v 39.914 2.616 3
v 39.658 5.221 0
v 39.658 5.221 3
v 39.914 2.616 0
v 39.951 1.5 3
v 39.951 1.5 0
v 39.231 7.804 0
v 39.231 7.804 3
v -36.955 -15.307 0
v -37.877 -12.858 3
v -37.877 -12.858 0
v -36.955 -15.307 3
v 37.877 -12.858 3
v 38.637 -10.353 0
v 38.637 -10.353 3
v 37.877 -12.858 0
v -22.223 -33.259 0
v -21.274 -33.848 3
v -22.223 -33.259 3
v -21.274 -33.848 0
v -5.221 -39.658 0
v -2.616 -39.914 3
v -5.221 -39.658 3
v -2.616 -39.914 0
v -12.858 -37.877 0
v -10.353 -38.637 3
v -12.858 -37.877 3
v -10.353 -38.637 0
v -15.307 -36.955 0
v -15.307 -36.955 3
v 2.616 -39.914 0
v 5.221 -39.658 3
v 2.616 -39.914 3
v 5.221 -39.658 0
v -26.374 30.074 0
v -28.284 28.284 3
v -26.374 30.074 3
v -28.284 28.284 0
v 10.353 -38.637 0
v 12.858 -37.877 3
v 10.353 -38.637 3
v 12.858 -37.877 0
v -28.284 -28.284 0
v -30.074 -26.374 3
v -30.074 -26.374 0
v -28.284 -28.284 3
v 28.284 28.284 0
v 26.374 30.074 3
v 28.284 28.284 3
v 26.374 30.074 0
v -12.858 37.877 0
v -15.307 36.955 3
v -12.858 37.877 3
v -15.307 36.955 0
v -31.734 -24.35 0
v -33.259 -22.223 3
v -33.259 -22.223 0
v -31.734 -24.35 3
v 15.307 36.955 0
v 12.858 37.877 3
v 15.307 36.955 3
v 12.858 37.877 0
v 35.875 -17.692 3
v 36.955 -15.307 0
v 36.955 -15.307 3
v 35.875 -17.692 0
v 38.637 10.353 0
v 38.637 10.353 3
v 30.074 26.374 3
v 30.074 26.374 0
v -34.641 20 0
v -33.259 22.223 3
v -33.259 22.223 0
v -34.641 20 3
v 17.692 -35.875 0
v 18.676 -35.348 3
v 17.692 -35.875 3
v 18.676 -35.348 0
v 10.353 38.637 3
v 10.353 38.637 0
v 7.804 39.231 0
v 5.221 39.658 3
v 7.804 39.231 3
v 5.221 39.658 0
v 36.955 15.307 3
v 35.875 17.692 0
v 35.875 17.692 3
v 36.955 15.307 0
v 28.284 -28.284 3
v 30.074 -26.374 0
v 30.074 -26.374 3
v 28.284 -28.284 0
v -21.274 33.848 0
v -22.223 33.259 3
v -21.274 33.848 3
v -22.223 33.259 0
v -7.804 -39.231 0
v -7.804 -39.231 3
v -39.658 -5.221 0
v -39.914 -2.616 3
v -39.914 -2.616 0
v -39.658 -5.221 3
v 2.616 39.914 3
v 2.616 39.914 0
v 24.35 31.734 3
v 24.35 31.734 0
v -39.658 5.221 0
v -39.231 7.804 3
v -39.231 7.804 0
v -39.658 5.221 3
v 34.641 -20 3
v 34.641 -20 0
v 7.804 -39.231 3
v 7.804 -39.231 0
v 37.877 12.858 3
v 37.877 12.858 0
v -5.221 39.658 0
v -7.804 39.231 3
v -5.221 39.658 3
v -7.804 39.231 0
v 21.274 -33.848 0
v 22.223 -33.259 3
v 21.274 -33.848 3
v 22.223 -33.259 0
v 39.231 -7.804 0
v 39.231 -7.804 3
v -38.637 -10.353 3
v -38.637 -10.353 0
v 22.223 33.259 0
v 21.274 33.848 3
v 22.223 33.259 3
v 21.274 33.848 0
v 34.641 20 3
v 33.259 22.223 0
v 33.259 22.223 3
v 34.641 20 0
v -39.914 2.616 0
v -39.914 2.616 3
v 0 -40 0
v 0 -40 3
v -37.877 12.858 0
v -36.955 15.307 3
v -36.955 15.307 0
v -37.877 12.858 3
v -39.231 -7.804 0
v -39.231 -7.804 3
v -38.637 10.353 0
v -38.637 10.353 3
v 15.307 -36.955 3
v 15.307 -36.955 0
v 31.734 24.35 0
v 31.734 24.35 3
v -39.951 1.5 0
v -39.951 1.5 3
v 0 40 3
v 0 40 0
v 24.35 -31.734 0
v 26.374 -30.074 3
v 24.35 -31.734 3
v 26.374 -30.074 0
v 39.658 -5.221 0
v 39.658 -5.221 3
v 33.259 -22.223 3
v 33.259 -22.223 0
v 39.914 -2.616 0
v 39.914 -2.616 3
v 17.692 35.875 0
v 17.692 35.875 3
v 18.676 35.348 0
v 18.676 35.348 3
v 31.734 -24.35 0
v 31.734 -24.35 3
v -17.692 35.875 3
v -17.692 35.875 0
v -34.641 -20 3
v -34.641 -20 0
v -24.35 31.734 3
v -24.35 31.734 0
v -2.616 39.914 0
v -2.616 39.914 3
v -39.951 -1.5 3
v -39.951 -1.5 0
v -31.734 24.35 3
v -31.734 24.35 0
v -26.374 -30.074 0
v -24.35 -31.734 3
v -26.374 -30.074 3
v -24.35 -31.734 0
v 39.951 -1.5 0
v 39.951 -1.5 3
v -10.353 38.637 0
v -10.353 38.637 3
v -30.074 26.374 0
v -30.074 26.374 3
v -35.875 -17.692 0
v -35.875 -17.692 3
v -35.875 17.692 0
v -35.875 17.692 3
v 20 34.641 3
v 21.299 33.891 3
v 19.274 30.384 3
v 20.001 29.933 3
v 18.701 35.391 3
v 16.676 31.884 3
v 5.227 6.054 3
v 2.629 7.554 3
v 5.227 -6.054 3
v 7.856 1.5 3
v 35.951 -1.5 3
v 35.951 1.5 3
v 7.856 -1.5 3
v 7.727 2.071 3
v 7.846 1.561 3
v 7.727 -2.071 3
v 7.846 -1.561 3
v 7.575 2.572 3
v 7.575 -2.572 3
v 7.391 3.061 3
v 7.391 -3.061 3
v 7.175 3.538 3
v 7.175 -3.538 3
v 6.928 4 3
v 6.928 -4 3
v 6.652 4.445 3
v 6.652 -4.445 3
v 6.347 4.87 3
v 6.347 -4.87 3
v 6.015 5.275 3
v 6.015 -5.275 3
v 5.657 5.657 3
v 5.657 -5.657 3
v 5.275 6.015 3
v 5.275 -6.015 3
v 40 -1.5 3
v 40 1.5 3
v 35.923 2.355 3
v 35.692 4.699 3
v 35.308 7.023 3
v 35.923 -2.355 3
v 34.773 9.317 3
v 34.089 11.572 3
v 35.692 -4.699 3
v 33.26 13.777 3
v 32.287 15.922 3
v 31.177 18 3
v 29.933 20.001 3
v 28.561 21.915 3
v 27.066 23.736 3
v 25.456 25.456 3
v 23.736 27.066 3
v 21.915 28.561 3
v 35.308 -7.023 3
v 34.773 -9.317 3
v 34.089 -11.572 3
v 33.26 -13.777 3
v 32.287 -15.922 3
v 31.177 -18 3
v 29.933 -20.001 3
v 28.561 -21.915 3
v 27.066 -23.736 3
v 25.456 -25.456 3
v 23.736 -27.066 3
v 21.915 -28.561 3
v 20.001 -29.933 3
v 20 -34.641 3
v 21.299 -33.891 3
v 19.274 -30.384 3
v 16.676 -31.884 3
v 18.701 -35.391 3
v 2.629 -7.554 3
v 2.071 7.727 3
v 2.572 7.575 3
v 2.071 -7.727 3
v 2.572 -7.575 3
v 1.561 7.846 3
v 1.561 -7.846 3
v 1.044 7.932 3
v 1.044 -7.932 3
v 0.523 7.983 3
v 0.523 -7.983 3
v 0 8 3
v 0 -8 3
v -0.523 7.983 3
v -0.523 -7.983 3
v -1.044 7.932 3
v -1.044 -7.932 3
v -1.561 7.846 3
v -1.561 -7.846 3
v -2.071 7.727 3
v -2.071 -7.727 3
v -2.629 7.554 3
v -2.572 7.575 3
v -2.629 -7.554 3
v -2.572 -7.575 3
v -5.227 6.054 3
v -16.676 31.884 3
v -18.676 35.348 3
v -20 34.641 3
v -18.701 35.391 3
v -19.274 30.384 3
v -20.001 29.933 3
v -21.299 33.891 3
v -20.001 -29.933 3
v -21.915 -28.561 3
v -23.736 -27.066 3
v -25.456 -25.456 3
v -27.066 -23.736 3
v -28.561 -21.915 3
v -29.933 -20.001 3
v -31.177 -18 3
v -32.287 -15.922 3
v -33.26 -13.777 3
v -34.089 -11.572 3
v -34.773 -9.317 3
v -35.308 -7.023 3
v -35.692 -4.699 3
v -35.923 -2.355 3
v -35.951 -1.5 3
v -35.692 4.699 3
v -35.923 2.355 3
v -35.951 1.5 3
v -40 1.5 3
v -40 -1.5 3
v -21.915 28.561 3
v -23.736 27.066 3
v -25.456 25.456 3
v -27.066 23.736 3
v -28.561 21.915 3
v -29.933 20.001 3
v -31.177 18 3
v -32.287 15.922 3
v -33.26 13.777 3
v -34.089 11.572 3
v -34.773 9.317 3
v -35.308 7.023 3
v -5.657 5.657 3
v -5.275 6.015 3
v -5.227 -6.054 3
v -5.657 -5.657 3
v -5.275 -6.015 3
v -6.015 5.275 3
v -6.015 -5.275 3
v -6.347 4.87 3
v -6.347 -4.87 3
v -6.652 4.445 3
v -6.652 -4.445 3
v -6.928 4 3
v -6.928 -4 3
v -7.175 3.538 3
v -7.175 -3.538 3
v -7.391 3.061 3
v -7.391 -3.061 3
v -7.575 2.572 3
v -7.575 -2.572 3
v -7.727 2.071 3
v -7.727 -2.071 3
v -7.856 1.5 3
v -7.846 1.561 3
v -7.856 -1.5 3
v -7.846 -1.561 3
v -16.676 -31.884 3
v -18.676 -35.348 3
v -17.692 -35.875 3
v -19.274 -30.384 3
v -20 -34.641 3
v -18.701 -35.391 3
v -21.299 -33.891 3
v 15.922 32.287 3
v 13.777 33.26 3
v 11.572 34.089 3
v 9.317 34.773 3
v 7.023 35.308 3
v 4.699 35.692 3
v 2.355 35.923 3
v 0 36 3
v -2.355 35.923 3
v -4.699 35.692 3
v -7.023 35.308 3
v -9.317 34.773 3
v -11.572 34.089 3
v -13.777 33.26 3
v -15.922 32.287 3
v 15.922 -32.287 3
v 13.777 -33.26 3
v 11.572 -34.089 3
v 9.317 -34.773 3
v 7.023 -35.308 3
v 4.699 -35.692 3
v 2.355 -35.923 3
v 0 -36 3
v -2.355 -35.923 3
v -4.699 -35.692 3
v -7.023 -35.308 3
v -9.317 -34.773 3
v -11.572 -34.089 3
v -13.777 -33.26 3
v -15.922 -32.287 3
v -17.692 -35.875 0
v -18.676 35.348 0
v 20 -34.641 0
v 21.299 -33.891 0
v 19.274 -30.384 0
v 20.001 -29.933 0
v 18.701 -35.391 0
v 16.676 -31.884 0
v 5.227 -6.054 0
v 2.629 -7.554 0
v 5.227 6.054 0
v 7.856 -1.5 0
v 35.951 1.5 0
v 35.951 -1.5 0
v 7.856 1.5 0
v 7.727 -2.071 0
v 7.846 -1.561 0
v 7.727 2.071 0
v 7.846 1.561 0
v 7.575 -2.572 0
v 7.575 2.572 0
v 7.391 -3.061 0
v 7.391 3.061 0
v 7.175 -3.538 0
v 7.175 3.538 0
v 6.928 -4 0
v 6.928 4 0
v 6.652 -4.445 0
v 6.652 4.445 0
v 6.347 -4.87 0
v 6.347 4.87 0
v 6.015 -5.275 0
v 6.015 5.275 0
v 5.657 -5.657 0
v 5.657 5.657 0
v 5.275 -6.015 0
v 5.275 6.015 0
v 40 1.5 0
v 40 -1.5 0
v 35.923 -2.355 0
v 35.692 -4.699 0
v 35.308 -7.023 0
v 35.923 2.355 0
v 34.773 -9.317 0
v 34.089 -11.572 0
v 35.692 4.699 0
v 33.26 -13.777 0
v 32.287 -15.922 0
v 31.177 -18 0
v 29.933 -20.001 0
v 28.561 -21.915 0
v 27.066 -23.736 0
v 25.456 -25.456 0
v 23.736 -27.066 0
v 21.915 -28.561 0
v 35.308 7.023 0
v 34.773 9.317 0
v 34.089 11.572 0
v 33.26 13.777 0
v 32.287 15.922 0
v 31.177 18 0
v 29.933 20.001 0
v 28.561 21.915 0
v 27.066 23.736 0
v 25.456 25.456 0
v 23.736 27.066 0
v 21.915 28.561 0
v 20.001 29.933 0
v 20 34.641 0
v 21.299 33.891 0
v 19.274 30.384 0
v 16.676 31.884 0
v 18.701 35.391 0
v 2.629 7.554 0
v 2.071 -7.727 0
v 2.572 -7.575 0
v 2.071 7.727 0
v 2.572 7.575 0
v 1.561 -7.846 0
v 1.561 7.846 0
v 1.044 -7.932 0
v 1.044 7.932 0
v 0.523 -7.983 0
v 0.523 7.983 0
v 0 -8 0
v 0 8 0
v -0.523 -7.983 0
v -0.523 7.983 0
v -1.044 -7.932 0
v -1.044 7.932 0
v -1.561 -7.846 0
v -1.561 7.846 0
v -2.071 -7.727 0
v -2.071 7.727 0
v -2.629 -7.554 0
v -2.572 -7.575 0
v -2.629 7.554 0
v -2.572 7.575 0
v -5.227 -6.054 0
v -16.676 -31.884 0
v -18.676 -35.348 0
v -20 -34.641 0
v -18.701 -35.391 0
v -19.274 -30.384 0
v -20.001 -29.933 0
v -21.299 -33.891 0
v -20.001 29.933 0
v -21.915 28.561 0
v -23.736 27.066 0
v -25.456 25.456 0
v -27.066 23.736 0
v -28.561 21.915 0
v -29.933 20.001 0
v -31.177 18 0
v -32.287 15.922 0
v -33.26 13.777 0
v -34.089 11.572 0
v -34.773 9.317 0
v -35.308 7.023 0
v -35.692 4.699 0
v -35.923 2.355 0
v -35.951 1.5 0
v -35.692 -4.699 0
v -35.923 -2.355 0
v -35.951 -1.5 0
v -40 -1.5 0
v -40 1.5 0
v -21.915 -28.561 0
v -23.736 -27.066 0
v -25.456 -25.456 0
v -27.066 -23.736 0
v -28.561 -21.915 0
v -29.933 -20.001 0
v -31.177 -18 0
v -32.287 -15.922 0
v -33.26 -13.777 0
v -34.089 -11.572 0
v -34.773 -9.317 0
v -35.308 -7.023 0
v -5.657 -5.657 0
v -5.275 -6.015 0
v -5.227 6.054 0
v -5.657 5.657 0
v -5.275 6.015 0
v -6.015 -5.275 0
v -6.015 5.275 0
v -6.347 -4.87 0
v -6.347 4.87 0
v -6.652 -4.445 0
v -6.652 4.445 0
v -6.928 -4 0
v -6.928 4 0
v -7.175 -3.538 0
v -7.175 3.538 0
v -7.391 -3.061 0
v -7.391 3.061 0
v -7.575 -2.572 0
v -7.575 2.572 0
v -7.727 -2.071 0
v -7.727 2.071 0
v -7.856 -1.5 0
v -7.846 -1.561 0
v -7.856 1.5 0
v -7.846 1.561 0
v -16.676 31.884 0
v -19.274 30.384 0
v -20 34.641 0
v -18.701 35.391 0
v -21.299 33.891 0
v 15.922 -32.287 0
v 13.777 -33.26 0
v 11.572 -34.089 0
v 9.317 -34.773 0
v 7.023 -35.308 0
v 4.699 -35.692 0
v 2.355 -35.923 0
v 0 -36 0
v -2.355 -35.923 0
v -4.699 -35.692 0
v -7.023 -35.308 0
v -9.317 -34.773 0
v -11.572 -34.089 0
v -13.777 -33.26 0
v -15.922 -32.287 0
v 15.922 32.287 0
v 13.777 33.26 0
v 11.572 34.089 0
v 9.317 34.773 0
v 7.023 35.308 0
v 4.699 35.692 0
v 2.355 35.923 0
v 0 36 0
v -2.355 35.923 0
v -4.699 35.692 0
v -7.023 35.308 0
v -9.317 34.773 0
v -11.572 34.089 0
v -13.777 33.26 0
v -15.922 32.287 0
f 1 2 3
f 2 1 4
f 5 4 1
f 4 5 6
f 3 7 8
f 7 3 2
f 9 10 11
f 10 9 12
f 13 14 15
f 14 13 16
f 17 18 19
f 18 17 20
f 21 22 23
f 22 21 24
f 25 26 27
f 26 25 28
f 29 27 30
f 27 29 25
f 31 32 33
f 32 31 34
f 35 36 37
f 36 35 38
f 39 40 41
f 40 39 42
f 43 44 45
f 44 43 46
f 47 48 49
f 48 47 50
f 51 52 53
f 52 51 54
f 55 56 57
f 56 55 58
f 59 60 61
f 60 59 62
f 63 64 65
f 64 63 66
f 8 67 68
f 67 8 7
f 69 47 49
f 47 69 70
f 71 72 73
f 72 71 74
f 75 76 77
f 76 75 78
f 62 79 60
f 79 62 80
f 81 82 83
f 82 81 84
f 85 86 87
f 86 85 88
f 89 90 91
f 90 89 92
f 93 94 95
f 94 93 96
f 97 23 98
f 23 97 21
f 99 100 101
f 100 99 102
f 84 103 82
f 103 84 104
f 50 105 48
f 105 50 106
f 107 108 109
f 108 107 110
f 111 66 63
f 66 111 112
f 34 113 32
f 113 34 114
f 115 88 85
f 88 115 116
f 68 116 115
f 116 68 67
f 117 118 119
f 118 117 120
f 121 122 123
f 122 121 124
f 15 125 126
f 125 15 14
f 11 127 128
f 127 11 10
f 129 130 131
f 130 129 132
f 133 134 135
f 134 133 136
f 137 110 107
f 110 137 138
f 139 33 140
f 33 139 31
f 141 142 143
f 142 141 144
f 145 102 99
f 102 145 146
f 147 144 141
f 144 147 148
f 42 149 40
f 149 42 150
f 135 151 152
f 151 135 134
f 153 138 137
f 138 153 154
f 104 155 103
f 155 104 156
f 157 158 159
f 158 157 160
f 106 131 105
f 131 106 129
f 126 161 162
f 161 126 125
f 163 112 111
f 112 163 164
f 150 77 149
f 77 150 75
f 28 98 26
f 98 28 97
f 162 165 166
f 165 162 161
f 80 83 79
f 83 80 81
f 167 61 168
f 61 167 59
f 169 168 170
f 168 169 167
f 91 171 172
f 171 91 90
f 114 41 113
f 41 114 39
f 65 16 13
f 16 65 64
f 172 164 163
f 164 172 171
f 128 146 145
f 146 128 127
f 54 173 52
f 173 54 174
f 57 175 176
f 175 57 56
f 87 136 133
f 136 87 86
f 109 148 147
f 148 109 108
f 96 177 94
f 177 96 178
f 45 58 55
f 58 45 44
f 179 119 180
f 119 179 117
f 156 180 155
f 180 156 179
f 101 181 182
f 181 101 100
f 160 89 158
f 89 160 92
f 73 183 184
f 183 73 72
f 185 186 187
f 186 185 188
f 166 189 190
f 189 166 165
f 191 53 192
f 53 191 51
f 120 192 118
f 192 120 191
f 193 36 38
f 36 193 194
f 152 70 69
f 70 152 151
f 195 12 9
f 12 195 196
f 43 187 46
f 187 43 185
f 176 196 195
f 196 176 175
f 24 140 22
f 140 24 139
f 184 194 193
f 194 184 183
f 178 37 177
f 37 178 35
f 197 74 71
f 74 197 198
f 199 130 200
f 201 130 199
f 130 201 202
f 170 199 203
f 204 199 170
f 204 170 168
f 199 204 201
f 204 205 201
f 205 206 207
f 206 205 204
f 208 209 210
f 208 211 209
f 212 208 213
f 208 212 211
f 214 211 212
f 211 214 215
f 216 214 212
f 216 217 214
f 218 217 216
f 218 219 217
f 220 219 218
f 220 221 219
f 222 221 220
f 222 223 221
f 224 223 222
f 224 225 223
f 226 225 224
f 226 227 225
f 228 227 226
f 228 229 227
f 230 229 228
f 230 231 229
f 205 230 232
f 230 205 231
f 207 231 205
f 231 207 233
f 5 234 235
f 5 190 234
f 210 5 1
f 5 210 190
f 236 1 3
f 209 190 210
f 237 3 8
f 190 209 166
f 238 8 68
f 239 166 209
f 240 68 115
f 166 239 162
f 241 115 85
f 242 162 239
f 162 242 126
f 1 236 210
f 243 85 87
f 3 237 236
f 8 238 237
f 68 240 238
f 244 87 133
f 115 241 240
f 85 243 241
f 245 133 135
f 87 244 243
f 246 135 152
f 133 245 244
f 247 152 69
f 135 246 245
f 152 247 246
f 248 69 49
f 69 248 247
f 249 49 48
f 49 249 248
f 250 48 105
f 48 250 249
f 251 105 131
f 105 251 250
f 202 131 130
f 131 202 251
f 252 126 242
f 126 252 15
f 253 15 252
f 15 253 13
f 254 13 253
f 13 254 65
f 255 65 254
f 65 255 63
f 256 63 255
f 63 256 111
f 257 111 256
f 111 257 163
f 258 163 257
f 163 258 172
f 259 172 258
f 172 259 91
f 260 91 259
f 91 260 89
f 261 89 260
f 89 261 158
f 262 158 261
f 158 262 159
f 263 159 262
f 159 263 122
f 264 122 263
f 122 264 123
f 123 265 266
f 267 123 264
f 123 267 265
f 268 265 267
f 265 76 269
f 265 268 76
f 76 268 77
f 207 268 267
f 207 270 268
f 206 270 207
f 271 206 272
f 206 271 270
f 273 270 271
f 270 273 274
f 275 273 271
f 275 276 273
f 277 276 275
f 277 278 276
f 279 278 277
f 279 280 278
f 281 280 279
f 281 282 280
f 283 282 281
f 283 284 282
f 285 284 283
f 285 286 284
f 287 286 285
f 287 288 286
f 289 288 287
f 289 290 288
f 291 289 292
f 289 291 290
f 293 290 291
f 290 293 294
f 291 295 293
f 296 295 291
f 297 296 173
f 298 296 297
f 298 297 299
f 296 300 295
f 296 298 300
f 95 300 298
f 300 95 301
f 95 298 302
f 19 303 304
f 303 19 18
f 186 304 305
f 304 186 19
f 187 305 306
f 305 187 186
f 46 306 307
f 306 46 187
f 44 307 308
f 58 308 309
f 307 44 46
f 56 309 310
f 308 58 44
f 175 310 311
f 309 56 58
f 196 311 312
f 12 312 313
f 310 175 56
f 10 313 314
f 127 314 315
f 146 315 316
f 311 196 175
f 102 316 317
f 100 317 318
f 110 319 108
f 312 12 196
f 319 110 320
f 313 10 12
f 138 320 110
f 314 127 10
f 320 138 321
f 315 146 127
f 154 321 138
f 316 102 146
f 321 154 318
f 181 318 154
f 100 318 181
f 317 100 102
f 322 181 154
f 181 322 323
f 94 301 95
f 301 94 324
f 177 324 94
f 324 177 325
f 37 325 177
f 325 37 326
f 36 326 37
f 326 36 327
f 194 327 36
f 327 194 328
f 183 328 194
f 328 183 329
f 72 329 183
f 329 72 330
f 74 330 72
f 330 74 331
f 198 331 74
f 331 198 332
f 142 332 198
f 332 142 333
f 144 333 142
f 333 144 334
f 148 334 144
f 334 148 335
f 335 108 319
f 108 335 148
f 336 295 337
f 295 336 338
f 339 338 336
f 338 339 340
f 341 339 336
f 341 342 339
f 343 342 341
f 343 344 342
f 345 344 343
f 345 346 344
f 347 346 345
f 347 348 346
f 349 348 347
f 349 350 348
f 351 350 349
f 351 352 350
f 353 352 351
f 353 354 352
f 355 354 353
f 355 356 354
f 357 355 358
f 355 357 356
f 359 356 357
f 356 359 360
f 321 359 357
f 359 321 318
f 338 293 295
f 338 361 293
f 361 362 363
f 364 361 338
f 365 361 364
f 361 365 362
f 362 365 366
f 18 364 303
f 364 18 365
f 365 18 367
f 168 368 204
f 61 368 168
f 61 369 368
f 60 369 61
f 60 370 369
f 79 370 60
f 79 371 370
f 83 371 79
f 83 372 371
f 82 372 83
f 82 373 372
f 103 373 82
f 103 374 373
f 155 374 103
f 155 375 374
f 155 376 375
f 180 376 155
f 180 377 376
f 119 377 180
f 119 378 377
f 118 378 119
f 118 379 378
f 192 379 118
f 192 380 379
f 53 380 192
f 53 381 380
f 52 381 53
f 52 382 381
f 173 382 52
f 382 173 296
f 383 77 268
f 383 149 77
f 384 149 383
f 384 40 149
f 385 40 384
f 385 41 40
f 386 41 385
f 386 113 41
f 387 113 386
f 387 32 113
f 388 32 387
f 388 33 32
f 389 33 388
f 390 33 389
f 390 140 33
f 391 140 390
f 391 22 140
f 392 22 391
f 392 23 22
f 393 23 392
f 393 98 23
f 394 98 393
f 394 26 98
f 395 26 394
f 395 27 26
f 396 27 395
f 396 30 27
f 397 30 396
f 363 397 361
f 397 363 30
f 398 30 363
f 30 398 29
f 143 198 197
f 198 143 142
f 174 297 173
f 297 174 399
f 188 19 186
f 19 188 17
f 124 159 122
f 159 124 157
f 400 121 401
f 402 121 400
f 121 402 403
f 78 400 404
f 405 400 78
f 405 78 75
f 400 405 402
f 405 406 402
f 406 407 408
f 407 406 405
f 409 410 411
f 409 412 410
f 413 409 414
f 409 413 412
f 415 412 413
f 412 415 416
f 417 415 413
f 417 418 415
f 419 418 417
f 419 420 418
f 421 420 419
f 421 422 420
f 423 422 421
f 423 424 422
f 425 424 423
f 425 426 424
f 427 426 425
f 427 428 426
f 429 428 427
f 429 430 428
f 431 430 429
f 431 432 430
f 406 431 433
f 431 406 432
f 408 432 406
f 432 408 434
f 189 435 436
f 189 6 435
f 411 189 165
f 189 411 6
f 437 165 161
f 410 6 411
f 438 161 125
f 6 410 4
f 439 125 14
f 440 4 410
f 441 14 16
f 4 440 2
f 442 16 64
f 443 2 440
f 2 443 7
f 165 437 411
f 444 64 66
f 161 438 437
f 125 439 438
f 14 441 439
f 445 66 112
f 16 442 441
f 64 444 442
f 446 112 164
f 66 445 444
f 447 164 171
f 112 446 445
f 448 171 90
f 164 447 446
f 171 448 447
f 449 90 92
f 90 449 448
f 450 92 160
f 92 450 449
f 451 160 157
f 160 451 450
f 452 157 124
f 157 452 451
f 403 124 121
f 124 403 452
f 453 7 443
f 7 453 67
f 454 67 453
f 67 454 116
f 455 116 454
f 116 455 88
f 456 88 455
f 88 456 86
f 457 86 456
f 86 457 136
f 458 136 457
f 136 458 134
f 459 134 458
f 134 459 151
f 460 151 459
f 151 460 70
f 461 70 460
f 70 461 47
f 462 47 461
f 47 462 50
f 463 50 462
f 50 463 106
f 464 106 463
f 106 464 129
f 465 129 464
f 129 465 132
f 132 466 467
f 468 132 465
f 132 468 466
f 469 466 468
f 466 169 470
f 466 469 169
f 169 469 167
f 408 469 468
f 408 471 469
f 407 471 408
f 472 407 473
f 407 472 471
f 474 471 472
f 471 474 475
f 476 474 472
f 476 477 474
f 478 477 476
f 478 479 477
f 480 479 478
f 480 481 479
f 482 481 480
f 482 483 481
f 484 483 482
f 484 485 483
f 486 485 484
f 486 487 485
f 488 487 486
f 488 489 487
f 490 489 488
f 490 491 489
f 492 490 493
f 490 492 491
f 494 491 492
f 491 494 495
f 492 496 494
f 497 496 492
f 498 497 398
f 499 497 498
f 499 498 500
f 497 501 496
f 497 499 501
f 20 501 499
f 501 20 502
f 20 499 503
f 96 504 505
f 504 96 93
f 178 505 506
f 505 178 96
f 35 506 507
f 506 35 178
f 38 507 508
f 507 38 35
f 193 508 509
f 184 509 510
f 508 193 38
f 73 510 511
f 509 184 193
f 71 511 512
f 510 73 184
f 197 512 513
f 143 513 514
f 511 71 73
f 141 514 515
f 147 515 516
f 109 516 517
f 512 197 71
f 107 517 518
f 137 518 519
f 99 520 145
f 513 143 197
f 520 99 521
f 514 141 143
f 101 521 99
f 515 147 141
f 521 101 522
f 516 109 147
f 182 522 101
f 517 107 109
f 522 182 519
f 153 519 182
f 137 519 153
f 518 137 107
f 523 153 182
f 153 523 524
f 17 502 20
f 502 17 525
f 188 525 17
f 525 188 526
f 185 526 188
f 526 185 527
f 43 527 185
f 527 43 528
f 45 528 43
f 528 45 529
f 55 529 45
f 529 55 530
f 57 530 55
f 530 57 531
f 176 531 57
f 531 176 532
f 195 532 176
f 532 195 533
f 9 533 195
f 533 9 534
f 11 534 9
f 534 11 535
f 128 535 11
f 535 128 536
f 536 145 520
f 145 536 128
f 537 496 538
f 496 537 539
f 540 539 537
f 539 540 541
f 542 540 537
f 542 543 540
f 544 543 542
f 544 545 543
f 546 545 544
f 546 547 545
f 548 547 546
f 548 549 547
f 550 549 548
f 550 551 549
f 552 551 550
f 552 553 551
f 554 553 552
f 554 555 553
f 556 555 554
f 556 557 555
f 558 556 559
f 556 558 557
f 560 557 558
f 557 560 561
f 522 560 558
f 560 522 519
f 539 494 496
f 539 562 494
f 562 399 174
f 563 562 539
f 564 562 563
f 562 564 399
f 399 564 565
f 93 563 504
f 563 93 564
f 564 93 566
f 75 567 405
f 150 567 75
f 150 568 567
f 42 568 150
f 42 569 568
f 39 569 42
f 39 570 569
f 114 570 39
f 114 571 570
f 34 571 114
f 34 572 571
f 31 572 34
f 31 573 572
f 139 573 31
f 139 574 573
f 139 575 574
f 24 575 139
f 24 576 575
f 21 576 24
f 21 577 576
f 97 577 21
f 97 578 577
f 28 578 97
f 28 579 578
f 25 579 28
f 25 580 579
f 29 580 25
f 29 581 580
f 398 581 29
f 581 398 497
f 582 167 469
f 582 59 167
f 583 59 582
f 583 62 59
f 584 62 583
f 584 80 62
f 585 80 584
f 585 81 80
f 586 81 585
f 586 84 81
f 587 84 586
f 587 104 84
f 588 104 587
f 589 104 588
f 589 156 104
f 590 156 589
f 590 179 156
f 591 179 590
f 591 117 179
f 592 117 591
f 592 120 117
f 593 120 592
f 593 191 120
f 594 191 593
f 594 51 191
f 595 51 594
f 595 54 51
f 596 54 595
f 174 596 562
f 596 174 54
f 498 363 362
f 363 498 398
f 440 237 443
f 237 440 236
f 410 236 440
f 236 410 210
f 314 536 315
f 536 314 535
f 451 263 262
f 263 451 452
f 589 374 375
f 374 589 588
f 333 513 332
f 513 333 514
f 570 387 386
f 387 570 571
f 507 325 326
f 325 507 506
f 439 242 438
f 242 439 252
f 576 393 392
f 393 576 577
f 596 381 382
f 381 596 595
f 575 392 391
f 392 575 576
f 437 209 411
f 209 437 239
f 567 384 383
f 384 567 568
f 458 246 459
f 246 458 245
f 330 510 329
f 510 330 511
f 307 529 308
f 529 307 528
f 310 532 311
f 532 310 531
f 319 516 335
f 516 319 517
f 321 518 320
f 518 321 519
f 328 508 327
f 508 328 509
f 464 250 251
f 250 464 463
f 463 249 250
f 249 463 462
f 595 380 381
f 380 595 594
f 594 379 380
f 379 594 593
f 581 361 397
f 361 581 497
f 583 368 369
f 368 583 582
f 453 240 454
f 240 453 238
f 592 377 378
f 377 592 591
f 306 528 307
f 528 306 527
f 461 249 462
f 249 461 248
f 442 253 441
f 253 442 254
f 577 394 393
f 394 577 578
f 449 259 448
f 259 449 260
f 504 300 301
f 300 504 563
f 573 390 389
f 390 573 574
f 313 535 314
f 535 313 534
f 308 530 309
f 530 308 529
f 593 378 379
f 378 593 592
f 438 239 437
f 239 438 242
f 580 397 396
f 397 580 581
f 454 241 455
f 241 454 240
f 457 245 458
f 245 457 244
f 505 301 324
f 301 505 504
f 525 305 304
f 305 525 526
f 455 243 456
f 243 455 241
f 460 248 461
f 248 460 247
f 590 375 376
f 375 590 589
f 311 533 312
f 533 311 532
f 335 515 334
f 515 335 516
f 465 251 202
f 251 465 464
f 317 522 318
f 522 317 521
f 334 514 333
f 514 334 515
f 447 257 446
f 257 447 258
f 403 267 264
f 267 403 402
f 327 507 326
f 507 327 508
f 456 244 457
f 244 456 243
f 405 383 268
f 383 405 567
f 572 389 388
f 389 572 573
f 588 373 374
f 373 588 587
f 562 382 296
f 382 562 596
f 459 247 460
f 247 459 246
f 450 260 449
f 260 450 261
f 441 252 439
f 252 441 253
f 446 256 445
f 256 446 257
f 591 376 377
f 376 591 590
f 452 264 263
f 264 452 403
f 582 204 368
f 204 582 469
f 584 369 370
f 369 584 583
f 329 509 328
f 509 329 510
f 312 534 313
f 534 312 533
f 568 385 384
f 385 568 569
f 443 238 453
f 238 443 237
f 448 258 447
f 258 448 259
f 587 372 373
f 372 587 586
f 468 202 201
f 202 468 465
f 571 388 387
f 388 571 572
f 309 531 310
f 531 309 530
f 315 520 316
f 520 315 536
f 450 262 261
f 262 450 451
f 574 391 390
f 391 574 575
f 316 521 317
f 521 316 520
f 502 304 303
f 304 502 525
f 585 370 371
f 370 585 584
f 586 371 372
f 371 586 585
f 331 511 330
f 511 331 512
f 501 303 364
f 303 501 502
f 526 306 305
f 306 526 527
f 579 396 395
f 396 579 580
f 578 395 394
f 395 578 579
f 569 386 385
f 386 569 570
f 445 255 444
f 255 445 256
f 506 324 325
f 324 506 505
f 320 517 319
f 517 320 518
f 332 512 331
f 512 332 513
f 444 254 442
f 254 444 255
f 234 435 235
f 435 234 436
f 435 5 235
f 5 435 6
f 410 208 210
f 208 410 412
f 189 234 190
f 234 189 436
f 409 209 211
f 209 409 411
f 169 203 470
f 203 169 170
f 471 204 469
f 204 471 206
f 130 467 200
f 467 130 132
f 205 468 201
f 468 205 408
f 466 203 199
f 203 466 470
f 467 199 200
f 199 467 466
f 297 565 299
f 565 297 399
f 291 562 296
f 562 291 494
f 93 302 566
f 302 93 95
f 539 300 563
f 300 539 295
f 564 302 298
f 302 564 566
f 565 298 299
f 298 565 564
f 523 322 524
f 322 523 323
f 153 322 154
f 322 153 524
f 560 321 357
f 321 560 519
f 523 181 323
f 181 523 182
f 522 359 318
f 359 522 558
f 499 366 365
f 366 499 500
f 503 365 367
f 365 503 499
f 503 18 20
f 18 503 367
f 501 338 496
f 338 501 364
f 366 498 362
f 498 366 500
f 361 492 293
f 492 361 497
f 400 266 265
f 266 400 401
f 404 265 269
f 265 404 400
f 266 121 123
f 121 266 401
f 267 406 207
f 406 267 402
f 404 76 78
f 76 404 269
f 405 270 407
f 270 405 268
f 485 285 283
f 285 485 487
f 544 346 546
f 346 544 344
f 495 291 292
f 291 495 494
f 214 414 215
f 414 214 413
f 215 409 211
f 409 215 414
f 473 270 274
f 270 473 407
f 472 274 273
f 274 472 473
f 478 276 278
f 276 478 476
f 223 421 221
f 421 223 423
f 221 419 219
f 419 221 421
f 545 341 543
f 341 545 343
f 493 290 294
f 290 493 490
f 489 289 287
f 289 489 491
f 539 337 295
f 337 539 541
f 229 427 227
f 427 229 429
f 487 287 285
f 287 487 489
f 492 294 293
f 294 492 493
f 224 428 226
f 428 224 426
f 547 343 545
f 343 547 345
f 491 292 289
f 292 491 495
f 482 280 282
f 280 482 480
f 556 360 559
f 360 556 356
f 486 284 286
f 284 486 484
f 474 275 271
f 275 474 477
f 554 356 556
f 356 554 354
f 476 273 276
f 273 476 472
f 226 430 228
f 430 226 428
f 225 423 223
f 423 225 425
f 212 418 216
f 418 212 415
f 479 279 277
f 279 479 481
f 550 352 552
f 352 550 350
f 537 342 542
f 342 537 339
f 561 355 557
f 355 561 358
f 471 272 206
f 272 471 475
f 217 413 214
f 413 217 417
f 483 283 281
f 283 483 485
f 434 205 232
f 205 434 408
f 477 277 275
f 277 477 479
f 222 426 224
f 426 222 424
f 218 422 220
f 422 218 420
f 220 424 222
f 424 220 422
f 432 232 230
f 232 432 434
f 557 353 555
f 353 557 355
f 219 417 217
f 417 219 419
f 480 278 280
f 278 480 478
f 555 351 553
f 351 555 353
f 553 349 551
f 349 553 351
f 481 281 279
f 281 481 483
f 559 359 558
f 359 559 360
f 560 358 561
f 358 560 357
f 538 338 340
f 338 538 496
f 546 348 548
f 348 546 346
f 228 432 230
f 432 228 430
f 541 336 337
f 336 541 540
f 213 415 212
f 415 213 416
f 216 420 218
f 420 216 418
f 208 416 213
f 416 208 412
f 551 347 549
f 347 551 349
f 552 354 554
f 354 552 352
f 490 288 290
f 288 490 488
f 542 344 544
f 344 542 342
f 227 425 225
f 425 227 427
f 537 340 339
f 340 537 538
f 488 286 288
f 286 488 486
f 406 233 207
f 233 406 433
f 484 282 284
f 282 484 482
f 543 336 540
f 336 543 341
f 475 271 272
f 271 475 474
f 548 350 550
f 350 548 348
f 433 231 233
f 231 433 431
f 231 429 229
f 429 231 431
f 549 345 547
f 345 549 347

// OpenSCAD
// Fan guard / grill - an outer ring, a central hub and radial spokes. NOVEL general part.
//
// @desc fan guard / grill - a ring with a hub and radial spokes
// @prompt Design a fan guard in OpenSCAD: a {od} mm outer ring with a central hub {hub_d} mm across and {spokes} radial spokes, {t} mm thick. Reply with a single complete OpenSCAD file.
// @param od     outer diameter, mm   [40:140]
// @param spokes number of spokes     [4:10:1]
// @param t      thickness, mm        [2:5]
// @param hub_d  hub diameter, mm     [8:25]

od     = 80;
spokes = 6;
t      = 3;
hub_d  = 16;

$fn = 96;

ring_w = 4;

union() {
    difference() {
        cylinder(h = t, d = od);
        translate([0, 0, -1]) cylinder(h = t + 2, d = od - 2 * ring_w);
    }
    cylinder(h = t, d = hub_d);
    for (i = [0 : spokes - 1])
        rotate([0, 0, i * 360 / spokes]) translate([0, -1.5, 0]) cube([od / 2, 3, t]);
}
